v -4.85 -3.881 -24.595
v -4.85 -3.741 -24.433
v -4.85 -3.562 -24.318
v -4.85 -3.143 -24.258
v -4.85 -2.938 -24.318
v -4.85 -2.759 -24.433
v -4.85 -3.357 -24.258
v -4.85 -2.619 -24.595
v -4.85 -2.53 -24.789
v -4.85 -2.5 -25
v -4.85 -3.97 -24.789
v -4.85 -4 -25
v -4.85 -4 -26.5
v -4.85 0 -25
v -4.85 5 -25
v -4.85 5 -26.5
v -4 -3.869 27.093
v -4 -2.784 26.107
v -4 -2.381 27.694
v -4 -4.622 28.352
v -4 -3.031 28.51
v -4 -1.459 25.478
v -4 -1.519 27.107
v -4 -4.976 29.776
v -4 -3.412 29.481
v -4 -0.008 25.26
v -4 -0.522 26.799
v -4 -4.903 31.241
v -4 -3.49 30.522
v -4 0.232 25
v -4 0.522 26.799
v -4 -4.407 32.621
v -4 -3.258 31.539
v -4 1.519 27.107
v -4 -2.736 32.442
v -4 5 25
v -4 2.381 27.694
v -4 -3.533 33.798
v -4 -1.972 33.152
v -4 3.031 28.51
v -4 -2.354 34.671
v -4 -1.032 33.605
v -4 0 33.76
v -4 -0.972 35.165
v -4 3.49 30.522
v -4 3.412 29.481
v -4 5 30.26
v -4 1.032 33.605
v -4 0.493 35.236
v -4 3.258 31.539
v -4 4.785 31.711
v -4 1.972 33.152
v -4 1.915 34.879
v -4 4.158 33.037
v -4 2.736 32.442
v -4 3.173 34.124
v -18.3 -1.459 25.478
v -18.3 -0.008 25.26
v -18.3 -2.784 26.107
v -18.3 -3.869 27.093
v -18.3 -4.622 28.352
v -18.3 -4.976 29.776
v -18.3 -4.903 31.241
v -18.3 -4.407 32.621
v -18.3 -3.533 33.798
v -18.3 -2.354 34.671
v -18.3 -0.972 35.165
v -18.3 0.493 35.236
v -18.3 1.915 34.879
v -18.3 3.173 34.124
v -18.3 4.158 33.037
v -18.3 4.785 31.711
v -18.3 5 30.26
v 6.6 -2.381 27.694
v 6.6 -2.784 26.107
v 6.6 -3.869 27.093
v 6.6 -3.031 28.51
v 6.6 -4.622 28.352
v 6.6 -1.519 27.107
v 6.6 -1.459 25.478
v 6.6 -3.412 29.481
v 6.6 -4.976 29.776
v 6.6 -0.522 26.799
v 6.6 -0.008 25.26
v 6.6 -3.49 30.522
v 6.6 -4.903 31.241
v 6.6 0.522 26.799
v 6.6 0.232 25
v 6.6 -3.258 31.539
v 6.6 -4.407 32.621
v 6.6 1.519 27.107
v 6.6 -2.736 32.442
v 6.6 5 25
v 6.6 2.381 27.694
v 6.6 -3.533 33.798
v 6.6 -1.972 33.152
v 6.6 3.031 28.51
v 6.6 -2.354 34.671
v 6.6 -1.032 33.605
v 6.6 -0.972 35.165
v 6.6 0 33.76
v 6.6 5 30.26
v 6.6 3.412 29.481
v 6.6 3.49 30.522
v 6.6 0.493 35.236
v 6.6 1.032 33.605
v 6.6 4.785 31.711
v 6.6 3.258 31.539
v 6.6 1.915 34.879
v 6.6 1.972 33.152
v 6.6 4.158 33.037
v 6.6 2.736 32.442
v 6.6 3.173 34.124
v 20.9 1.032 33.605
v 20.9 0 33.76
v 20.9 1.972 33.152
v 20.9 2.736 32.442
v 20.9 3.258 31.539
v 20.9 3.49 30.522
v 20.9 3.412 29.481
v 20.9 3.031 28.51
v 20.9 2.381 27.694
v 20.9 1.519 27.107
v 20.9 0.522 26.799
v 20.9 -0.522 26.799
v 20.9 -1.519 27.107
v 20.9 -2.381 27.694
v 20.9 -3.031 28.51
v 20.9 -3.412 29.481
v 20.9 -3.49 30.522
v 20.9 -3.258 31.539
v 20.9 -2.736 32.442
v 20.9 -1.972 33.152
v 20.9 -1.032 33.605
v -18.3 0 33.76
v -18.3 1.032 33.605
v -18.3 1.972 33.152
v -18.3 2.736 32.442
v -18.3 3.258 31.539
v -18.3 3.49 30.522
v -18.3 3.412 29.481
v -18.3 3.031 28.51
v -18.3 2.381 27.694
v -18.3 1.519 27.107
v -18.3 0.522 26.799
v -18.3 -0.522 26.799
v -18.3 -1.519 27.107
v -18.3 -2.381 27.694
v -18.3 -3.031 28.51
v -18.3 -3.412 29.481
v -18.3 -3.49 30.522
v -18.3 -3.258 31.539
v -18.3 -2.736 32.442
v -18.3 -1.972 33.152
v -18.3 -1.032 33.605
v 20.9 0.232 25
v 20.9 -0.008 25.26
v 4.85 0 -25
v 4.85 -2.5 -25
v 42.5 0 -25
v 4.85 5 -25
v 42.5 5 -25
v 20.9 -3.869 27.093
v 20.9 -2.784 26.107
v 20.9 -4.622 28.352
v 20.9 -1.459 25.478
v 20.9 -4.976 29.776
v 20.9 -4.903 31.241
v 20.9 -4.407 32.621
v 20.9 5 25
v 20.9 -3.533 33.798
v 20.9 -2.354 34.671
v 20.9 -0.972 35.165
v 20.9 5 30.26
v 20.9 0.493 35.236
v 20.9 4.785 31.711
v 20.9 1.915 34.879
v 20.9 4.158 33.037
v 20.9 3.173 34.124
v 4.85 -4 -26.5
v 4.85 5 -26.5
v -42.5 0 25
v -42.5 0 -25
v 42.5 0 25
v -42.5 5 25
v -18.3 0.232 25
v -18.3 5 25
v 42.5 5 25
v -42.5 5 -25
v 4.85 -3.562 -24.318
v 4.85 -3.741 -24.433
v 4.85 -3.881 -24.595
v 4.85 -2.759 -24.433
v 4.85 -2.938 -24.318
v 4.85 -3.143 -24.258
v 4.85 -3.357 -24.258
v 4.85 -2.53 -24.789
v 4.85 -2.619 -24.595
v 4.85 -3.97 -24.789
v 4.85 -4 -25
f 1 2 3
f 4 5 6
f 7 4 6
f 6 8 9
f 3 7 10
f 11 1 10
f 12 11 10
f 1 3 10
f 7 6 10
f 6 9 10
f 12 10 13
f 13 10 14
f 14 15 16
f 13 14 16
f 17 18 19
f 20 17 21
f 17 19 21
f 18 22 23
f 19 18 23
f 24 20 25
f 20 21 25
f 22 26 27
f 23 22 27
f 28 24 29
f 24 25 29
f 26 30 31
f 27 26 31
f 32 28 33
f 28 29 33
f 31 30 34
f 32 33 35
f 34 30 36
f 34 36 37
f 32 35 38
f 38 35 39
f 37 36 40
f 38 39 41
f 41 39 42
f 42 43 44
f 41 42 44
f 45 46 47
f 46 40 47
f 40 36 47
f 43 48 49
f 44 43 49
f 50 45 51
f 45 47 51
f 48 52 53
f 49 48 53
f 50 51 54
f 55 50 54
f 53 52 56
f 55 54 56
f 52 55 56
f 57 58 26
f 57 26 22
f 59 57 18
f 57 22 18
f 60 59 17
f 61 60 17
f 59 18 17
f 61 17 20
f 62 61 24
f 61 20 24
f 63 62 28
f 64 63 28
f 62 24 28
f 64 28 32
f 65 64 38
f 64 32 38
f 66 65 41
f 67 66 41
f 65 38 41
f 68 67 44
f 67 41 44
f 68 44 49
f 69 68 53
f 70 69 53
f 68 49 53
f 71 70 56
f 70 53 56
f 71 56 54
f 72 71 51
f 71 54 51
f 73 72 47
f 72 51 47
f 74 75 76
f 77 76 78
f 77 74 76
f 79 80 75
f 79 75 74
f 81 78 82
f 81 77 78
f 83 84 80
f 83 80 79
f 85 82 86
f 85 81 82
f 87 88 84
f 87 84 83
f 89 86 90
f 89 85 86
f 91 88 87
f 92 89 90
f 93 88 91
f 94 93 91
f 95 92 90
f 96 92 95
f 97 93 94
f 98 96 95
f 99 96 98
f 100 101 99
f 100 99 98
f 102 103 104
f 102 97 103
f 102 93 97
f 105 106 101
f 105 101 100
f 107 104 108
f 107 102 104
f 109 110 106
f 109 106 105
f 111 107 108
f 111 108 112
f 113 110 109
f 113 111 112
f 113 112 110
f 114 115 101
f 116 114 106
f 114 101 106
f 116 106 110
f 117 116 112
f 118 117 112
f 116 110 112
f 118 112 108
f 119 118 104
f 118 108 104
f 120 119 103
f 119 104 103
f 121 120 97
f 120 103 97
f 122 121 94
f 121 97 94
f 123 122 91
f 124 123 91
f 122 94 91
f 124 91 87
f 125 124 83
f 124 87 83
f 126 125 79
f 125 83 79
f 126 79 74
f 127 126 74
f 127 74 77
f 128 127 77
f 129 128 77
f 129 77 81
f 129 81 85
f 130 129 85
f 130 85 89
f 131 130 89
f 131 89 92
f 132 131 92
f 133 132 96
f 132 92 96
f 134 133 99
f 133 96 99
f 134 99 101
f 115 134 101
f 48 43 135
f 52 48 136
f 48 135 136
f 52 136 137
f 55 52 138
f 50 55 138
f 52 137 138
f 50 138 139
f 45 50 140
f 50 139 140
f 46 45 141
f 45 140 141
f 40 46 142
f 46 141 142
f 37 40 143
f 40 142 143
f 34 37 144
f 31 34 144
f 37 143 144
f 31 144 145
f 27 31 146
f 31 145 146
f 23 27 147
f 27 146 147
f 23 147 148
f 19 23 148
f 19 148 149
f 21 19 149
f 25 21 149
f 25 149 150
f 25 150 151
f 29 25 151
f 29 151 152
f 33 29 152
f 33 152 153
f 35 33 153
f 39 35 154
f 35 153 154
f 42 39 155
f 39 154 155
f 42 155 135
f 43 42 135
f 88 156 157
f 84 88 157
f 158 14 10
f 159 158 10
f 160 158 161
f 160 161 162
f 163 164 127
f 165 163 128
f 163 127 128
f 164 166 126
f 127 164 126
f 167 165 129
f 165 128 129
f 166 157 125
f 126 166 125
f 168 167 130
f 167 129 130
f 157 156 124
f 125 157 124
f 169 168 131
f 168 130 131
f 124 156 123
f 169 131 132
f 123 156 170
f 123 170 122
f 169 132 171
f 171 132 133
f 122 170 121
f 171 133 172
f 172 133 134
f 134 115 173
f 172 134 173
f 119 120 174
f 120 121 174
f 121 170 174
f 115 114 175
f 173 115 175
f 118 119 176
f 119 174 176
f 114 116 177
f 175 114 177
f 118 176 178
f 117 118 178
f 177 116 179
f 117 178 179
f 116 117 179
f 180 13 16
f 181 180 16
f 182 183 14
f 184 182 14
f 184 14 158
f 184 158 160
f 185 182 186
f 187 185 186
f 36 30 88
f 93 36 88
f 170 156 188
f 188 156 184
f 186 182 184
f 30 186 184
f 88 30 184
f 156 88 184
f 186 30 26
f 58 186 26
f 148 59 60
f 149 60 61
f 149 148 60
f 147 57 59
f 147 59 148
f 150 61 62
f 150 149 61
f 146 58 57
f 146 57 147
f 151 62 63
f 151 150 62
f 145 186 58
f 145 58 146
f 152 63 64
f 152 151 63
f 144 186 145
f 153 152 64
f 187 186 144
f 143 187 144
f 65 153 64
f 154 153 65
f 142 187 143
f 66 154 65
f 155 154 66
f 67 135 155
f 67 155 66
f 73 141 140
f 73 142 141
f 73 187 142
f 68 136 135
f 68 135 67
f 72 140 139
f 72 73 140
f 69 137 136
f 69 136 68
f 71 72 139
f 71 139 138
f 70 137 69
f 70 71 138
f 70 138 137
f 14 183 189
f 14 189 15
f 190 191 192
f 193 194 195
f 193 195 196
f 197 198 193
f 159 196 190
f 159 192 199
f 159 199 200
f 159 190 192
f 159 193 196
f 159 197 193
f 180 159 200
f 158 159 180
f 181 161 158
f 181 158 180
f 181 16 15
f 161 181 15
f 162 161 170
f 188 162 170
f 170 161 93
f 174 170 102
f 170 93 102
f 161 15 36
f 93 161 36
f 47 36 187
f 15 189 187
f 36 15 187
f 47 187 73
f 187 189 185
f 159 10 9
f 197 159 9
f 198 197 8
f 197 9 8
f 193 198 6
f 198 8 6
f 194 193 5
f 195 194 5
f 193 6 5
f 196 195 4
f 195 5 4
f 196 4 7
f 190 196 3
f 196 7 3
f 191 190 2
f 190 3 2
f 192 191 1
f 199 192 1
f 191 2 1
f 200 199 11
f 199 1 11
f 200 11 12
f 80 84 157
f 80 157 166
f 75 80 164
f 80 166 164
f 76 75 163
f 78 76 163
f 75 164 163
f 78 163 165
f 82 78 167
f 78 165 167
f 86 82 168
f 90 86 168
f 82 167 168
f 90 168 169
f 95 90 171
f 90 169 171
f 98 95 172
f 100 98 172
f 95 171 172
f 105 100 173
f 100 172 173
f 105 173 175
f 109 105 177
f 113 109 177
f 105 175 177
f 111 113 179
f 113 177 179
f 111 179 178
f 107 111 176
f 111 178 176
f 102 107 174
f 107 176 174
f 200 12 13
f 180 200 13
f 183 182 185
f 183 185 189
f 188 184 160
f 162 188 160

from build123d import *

# Parameters (mm, degrees)
ESQUISSE1_W                = 85
ESQUISSE1_H                = 50
BOSS_EXTRU_1_DEPTH         = 5
BOSS_EXTRU_2_START         = -14.3
BOSS_EXTRU_2_DEPTH         = 14.3
ESQUISSE3_R                = 3.5
ENL_V_MAT_EXTRU_1_DEPTH    = 14.3
R_P_TITION_LIN_AIRE2_COUNT = 2
R_P_TITION_LIN_AIRE2_PITCH = 24.9
BOSS_EXTRU_3_DEPTH         = 4.85
BOSS_EXTRU_3_DEPTH_BACK    = 4.85


# Read off the part's stored shape, not the designer's step: Boss.-Extru.2
with BuildPart() as part:
    # Esquisse1 → Boss.-Extru.1 (new body)
    with BuildSketch(Plane(origin=(0, 0, 0), x_dir=(1, 0, 0), z_dir=(0, 1, 0))):
        Rectangle(ESQUISSE1_W, ESQUISSE1_H)
    extrude(amount=BOSS_EXTRU_1_DEPTH)

    # Boss.-Extru.2 outline → Boss.-Extru.2 (add)
    with BuildSketch(Plane.ZY.offset(18.3).offset(BOSS_EXTRU_2_START)):
        with BuildLine():
            Line((25, 5), (25, 0.23226176))
            Line((25, 0.23226176), (25.260006787, -0.008238034))
            ThreePointArc((25.260006787, -0.008238034), (33.798445292, -3.53262012), (30.26, 5))
            Line((30.26, 5), (25, 5))
        make_face()
    boss_extru_2 = extrude(amount=BOSS_EXTRU_2_DEPTH)

    # Esquisse3 → Enlèv. mat.-Extru.1 (cut)
    with BuildSketch(Plane.ZY.offset(18.3)):
        with Locations((30.26, 0)):
            Circle(ESQUISSE3_R)
    enl_v_mat_extru_1 = extrude(amount=-ENL_V_MAT_EXTRU_1_DEPTH, mode=Mode.SUBTRACT)

    # Répétition linéaire2: Boss.-Extru.2, Enlèv. mat.-Extru.1 ×2
    with Locations(*[(i * R_P_TITION_LIN_AIRE2_PITCH, 0, 0) for i in range(1, R_P_TITION_LIN_AIRE2_COUNT)]):
        add(boss_extru_2)
        add(enl_v_mat_extru_1, mode=Mode.SUBTRACT)

    # Esquisse4 → Boss.-Extru.3 (add, two sides: drawn at the far end of the back side and taken through both)
    with BuildSketch(Plane(origin=(0, 0, 0), x_dir=(0, 0, -1), z_dir=(1, 0, 0)).offset(-BOSS_EXTRU_3_DEPTH_BACK)):
        with BuildLine():
            Line((26.5, 5), (25, 5))
            Line((25, 5), (25, -2.5))
            ThreePointArc((25, -2.5), (24.25, -3.25), (25, -4))
            Line((25, -4), (26.5, -4))
            Line((26.5, -4), (26.5, 5))
        make_face()
    extrude(amount=BOSS_EXTRU_3_DEPTH + BOSS_EXTRU_3_DEPTH_BACK)


solid = part.part
